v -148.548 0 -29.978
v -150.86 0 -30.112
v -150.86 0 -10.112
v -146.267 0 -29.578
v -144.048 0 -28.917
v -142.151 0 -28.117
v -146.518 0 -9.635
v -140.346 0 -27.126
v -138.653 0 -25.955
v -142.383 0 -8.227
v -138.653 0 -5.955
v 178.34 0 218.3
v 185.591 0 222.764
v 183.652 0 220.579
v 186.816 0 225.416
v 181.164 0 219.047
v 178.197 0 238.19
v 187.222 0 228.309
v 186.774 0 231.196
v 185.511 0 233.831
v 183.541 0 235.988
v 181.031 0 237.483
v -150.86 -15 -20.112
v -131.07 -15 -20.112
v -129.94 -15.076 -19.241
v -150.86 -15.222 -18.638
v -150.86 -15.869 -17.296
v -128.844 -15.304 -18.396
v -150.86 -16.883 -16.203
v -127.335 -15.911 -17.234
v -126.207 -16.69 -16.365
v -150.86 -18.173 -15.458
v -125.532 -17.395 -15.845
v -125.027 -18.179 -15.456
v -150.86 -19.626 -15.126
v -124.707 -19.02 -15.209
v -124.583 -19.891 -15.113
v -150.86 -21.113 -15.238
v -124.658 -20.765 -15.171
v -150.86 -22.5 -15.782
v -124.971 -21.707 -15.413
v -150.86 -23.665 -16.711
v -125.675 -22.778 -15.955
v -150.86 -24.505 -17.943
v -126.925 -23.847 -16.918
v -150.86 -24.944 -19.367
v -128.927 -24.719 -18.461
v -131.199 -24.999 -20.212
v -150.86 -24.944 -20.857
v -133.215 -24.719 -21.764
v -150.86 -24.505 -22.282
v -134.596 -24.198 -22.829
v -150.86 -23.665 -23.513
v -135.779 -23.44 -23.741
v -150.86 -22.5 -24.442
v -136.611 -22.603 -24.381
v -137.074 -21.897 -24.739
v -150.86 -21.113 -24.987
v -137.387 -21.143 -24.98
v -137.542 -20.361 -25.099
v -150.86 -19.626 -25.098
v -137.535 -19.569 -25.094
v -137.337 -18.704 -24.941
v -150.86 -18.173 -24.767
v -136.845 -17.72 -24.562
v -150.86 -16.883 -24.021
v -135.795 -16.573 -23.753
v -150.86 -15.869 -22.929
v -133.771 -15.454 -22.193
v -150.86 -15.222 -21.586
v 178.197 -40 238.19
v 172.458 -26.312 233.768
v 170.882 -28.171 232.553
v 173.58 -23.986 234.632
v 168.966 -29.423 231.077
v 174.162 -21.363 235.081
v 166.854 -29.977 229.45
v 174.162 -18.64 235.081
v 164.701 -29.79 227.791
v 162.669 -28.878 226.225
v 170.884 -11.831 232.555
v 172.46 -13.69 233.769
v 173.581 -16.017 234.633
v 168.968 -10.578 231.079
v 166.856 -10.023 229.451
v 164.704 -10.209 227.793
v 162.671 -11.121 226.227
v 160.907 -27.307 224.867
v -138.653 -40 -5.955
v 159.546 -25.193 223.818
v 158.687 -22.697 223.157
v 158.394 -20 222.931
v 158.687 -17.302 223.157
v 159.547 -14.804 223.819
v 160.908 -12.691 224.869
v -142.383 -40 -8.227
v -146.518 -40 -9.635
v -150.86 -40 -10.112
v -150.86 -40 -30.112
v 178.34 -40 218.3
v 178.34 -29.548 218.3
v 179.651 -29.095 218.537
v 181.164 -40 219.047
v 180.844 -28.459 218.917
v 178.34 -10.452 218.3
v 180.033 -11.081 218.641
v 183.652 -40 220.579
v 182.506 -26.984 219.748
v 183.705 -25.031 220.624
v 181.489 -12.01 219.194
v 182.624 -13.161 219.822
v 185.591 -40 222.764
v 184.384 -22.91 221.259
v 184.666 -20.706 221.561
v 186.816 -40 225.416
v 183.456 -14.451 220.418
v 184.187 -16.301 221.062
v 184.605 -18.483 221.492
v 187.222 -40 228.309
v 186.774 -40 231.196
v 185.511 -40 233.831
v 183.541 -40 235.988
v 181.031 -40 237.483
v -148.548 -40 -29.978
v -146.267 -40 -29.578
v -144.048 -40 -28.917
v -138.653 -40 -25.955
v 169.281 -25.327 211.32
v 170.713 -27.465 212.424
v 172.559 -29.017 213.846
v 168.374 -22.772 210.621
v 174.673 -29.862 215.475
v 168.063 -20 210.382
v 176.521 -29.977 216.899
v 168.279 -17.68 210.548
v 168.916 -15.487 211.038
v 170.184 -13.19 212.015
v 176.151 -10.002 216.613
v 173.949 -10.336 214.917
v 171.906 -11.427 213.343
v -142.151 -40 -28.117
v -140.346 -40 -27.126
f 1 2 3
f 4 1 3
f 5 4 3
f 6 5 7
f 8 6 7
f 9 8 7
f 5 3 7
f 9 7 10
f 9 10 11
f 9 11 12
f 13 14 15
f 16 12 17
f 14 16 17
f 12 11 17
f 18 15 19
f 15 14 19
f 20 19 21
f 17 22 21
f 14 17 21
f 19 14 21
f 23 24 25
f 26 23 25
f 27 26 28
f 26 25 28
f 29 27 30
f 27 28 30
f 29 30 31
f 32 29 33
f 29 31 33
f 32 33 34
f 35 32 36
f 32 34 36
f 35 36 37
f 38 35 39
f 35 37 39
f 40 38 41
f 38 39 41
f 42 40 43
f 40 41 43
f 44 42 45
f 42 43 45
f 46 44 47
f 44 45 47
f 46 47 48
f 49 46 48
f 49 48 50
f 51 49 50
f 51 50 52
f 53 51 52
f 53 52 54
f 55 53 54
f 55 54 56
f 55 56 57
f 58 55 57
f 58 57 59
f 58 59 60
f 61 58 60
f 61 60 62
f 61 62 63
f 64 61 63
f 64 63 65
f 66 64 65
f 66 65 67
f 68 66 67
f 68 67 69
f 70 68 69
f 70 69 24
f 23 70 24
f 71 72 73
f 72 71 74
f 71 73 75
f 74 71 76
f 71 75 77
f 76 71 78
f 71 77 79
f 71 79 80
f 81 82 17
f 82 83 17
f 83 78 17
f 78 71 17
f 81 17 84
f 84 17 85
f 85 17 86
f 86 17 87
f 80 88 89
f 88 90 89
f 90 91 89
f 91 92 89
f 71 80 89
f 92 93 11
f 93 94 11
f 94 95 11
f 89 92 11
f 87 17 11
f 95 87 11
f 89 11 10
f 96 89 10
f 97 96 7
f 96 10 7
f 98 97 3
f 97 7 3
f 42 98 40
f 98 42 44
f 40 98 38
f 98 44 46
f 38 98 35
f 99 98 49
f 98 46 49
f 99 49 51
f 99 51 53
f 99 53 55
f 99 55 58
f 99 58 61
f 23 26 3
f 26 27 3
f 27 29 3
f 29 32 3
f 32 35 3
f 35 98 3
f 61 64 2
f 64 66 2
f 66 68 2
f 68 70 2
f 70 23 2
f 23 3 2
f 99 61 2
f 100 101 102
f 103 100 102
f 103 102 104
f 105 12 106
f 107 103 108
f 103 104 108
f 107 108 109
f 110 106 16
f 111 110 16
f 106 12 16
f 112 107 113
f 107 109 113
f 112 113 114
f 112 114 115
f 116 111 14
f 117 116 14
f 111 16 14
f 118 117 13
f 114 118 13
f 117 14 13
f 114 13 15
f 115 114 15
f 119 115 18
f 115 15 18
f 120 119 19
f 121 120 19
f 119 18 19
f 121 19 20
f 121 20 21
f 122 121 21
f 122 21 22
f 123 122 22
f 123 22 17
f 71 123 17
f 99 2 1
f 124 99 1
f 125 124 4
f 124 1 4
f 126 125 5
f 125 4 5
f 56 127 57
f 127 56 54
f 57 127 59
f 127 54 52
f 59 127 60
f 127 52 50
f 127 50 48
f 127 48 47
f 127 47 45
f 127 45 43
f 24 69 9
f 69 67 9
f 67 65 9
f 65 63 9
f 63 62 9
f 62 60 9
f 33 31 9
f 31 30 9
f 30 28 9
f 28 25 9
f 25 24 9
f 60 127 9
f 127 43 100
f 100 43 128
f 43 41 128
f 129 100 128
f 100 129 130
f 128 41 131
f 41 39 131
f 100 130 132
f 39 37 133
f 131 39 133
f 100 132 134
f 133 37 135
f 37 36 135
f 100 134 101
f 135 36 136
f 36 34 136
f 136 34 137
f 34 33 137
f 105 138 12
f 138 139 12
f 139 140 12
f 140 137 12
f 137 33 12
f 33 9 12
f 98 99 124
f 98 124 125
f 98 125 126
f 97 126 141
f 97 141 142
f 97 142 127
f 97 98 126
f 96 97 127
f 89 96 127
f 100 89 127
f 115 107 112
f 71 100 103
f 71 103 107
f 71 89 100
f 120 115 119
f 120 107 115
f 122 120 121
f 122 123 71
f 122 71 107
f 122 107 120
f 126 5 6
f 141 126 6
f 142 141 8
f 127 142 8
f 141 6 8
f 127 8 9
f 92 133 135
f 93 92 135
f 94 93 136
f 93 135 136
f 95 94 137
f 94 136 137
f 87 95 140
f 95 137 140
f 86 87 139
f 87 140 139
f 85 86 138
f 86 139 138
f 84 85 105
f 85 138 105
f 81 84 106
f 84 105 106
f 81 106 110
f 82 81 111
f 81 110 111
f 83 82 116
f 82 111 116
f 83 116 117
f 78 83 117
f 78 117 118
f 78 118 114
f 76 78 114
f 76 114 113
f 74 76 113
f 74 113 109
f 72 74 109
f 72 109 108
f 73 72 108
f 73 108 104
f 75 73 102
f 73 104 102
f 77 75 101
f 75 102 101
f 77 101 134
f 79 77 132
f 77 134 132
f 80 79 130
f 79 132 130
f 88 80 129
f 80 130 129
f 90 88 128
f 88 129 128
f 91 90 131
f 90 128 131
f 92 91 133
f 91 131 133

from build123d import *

# Parameters (mm, degrees)
F1_DEPTH = 40
F3_D     = 10
F5_D     = 20


with BuildPart() as f1:
    # F0 (on Front) → F1 (new body)
    with BuildSketch(Plane.XZ):
        with BuildLine():
            ThreePointArc((-138.652626, -5.954697), (-144.411955, -9.044339), (-150.859851, -10.112232))
            Line((-150.859851, -10.112232), (-150.859851, -30.112232))
            ThreePointArc((-150.859851, -30.112232), (-147.401977, -29.811042), (-144.048252, -28.916544))
            ThreePointArc((-144.048252, -28.916544), (-141.235816, -27.64443), (-138.652626, -25.954697))
            Line((-138.652626, -25.954697), (178.3398, 218.300084))
            ThreePointArc((178.3398, 218.300084), (187.221678, 228.309372), (178.19666, 238.189789))
            Line((178.19666, 238.189789), (-138.652626, -5.954697))
        make_face()
    extrude(amount=F1_DEPTH)

    # F3 (through all)
    with Locations(Plane(origin=(-150.859851, 0, 0), x_dir=(0, -1, 0), z_dir=(-1, 0, 0))):
        with Locations((20, -20.112232)):
            Hole(F3_D / 2)

    # F5 (through all)
    with Locations(Plane(origin=(-48.774778, 0, 63.299621), x_dir=(0.792123, 0, 0.610361), z_dir=(-0.610361, 0, 0.792123))):
        with Locations((271.53552, -20)):
            Hole(F5_D / 2)


solid = f1.part
